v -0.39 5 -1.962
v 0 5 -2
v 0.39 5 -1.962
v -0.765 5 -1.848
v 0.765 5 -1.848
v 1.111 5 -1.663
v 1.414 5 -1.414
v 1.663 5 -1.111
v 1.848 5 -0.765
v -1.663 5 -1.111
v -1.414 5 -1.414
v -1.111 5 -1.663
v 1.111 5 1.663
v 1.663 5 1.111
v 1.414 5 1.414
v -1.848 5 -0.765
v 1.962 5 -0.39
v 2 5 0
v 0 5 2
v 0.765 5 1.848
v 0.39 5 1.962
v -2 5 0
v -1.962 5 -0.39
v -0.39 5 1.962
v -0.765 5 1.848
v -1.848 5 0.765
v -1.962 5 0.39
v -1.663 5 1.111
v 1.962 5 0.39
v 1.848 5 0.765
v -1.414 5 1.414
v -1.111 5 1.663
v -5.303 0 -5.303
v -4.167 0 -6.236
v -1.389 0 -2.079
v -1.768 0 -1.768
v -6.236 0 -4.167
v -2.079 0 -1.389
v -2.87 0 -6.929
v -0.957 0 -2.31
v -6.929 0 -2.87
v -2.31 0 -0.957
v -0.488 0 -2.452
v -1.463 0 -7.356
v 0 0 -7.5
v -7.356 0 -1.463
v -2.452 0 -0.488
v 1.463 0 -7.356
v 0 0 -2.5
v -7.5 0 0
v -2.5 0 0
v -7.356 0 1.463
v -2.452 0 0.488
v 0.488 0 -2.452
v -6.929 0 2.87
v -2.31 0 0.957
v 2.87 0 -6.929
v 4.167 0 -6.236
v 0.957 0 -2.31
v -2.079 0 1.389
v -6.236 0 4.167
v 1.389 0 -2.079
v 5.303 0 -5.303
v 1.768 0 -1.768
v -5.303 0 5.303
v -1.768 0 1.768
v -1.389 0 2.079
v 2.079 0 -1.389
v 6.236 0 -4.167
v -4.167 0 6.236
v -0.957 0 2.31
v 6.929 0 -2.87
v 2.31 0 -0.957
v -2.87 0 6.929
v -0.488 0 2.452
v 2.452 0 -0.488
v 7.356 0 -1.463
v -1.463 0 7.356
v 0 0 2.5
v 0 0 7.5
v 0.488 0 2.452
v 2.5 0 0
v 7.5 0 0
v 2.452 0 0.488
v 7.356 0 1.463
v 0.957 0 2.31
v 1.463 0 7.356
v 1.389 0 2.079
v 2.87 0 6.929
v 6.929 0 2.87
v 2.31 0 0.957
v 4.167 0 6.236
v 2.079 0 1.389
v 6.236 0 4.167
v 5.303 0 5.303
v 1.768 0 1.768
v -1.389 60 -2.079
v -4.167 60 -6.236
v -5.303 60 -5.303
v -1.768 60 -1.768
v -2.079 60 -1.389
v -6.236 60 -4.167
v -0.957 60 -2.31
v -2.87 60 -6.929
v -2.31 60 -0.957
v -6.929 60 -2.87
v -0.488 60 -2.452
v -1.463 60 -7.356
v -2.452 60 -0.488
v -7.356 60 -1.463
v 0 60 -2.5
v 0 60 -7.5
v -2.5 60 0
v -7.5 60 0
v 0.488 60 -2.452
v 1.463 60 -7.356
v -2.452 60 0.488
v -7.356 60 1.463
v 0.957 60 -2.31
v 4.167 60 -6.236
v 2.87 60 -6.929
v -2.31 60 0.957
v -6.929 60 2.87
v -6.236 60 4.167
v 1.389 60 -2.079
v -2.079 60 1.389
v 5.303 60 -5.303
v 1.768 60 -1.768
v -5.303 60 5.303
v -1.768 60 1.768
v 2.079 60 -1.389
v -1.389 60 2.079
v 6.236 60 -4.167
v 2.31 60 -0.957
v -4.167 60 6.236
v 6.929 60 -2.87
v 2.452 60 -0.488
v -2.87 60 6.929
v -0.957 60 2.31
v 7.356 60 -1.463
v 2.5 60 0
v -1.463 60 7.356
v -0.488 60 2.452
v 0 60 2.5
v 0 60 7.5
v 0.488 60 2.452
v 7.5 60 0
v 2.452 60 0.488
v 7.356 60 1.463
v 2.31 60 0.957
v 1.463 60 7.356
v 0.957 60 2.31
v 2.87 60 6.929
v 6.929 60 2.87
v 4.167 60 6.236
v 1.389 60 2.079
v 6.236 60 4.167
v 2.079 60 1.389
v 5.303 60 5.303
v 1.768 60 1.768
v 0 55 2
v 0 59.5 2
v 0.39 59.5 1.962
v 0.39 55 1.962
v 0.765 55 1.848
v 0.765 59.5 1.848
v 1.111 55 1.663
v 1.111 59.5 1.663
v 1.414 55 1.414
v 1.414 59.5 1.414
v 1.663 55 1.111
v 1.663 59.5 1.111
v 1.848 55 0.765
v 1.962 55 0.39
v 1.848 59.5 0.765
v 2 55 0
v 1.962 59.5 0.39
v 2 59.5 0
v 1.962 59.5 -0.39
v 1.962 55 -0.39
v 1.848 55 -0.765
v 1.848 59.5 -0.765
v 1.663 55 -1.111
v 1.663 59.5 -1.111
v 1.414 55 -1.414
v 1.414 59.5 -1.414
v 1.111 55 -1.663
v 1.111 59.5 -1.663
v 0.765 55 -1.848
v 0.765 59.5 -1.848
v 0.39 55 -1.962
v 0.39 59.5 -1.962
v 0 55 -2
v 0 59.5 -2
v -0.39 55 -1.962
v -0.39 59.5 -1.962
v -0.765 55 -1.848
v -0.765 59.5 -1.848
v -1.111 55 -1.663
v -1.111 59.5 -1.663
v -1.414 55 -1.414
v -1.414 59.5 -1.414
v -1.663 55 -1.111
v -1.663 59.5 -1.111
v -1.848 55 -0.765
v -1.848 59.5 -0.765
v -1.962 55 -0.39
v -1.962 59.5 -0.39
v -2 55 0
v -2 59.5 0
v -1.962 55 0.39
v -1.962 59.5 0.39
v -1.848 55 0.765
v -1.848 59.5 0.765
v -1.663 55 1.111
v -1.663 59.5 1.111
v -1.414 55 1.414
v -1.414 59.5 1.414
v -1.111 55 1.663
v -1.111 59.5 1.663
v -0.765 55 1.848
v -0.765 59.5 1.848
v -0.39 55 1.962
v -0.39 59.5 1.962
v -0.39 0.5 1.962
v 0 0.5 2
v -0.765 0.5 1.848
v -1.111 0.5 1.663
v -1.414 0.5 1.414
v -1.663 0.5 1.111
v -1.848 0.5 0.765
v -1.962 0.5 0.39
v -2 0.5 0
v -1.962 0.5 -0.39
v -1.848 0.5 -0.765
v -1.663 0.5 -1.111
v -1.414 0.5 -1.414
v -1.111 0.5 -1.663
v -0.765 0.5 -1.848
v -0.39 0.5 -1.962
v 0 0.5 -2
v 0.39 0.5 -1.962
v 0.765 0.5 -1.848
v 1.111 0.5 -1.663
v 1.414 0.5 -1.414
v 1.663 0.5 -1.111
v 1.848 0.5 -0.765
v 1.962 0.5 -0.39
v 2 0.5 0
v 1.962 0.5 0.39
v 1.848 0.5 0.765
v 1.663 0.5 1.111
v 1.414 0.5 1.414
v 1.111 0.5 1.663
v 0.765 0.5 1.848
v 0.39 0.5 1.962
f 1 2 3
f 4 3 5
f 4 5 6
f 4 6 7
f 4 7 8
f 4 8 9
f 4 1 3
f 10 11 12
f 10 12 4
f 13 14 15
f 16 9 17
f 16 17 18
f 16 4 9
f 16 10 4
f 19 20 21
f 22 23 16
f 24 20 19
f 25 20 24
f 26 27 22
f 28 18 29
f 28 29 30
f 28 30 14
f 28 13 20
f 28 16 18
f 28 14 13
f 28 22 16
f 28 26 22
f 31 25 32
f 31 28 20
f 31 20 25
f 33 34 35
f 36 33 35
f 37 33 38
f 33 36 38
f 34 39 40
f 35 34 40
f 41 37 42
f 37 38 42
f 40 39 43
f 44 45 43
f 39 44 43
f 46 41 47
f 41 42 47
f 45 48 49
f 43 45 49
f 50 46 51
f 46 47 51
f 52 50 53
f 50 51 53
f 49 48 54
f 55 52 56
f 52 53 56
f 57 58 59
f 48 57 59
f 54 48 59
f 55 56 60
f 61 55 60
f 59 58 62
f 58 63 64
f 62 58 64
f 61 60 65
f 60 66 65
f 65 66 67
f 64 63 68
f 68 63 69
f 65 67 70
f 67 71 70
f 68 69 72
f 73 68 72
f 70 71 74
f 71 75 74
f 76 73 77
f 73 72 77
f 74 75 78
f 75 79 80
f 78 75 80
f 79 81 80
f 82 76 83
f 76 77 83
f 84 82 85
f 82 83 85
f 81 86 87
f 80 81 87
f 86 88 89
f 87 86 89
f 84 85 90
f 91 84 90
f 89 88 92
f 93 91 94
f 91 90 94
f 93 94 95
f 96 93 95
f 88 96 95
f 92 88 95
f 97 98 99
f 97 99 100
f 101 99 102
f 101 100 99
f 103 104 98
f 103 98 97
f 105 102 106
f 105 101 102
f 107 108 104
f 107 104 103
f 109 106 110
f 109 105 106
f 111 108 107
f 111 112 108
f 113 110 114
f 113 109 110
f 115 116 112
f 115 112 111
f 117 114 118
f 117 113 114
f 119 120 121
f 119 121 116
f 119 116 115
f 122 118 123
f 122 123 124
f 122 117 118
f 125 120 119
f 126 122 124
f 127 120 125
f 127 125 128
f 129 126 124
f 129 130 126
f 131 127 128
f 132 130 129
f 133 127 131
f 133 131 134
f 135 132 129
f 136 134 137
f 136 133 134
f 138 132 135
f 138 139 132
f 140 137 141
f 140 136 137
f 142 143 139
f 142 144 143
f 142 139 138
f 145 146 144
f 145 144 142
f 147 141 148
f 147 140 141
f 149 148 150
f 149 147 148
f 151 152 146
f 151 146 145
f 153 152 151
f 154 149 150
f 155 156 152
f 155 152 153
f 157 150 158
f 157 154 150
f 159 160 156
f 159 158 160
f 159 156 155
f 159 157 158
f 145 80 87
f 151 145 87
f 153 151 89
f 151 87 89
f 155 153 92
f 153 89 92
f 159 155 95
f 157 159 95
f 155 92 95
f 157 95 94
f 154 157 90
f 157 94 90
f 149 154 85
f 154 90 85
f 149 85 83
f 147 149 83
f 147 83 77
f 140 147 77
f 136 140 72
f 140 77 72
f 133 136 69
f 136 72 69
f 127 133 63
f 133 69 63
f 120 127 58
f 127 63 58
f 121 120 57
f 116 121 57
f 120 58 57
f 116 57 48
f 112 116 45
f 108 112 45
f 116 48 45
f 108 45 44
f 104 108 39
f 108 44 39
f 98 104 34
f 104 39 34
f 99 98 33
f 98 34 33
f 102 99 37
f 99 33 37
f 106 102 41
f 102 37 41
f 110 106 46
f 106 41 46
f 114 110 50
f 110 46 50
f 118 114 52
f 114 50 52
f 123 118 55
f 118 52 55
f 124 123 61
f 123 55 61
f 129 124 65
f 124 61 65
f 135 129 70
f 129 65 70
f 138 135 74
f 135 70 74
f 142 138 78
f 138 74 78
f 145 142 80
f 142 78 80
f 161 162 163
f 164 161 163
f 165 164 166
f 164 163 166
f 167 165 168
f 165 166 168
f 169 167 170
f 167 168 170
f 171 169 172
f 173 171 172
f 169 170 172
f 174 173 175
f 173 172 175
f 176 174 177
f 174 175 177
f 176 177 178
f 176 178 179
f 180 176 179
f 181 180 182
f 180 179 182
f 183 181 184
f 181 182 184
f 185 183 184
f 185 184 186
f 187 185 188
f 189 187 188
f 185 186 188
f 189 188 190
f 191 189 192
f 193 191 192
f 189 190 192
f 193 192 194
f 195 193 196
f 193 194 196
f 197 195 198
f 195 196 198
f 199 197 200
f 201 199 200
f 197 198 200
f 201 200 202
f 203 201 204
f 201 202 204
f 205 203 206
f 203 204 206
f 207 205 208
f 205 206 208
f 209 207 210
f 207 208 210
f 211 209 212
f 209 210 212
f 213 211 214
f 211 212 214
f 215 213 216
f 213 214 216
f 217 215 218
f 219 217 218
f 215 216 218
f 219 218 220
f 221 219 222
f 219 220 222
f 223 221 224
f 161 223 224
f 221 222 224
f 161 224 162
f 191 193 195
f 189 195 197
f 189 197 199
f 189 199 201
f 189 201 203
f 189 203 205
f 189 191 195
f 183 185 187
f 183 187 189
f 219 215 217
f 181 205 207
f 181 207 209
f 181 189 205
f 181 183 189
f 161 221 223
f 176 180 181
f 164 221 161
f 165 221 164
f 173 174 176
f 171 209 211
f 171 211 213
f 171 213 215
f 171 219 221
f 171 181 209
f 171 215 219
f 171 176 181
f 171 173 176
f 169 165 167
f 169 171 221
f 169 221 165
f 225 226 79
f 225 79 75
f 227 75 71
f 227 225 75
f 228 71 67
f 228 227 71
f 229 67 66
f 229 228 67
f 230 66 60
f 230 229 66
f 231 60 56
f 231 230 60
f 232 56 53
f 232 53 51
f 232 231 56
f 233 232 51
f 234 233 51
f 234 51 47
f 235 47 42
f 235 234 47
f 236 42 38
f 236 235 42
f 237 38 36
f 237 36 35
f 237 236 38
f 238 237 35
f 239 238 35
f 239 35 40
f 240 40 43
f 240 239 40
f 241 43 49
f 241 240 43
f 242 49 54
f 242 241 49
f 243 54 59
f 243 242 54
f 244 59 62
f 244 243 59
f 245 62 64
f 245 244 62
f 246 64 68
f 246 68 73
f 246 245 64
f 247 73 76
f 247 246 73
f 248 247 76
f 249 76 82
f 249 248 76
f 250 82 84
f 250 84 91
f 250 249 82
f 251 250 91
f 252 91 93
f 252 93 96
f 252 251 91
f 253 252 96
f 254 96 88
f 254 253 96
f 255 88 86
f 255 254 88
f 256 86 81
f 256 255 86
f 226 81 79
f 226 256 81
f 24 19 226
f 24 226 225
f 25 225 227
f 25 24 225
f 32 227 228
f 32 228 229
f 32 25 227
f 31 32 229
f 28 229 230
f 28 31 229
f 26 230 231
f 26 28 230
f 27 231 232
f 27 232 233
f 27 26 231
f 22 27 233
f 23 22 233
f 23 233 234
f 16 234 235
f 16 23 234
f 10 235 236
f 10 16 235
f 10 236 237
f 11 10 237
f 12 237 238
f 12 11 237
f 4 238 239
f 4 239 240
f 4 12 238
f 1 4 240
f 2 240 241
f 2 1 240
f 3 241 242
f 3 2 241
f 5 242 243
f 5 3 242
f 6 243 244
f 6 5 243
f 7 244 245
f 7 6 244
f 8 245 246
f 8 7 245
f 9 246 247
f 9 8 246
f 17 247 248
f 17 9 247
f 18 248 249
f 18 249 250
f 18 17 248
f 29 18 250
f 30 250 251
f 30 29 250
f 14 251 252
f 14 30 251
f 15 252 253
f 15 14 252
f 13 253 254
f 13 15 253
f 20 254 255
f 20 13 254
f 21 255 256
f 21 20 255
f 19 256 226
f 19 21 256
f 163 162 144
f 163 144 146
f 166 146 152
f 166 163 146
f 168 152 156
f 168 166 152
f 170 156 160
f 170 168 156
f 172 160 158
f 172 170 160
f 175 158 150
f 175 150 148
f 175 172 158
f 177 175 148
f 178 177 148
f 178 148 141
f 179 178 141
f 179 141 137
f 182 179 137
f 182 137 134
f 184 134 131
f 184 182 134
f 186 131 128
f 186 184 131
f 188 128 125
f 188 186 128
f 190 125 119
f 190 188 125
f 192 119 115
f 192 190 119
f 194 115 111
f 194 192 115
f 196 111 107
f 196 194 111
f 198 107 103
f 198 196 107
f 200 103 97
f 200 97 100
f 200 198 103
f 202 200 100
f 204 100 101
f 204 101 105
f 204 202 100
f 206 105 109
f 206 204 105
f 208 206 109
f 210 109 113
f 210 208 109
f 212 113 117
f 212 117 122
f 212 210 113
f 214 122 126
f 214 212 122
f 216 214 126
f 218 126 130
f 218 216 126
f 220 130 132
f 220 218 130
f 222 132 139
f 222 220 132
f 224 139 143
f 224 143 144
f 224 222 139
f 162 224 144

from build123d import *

# Parameters (mm, degrees)
SKETCH1_R           = 7.5
BOSS_EXTRUDE1_DEPTH = 60
SKETCH2_R           = 2
CUT_EXTRUDE1_DEPTH  = 5
CHAMFER1_SIZE       = 0.5
CUT_EXTRUDE2_START  = -5
SKETCH3_R           = 2
CUT_EXTRUDE2_DEPTH  = 5
CHAMFER2_SIZE       = 0.5


with BuildPart() as part:
    # Sketch1 → Boss-Extrude1 (new body)
    with BuildSketch(Plane(origin=(0, 0, 0), x_dir=(1, 0, 0), z_dir=(0, 1, 0))):
        with Locations(Location((0, 0, 0), (0, 0, 270))):
            Circle(SKETCH1_R)
    extrude(amount=BOSS_EXTRUDE1_DEPTH)

    # Sketch2 → Cut-Extrude1 (cut)
    with BuildSketch(Plane(origin=(0, 60, 0), x_dir=(1, 0, 0), z_dir=(0, 1, 0))):
        with Locations(Location((0, 0, 0), (0, 0, 270))):
            Circle(SKETCH2_R)
    extrude(amount=-CUT_EXTRUDE1_DEPTH, mode=Mode.SUBTRACT)

    # Chamfer1
    chamfer1_edges = [part.edges().sort_by_distance(p)[0] for p in [
        (0, 60, -2),
    ]]
    chamfer(chamfer1_edges, length=CHAMFER1_SIZE)

    # Sketch3 → Cut-Extrude2 (cut)
    with BuildSketch(Plane.XZ.offset(CUT_EXTRUDE2_START)):
        with Locations(Location((0, 0, 0), (0, 0, 90))):
            Circle(SKETCH3_R)
    extrude(amount=CUT_EXTRUDE2_DEPTH, mode=Mode.SUBTRACT)

    # Chamfer2
    chamfer2_edges = [part.edges().sort_by_distance(p)[0] for p in [
        (0, 0, -2),
    ]]
    chamfer(chamfer2_edges, length=CHAMFER2_SIZE)


solid = part.part
